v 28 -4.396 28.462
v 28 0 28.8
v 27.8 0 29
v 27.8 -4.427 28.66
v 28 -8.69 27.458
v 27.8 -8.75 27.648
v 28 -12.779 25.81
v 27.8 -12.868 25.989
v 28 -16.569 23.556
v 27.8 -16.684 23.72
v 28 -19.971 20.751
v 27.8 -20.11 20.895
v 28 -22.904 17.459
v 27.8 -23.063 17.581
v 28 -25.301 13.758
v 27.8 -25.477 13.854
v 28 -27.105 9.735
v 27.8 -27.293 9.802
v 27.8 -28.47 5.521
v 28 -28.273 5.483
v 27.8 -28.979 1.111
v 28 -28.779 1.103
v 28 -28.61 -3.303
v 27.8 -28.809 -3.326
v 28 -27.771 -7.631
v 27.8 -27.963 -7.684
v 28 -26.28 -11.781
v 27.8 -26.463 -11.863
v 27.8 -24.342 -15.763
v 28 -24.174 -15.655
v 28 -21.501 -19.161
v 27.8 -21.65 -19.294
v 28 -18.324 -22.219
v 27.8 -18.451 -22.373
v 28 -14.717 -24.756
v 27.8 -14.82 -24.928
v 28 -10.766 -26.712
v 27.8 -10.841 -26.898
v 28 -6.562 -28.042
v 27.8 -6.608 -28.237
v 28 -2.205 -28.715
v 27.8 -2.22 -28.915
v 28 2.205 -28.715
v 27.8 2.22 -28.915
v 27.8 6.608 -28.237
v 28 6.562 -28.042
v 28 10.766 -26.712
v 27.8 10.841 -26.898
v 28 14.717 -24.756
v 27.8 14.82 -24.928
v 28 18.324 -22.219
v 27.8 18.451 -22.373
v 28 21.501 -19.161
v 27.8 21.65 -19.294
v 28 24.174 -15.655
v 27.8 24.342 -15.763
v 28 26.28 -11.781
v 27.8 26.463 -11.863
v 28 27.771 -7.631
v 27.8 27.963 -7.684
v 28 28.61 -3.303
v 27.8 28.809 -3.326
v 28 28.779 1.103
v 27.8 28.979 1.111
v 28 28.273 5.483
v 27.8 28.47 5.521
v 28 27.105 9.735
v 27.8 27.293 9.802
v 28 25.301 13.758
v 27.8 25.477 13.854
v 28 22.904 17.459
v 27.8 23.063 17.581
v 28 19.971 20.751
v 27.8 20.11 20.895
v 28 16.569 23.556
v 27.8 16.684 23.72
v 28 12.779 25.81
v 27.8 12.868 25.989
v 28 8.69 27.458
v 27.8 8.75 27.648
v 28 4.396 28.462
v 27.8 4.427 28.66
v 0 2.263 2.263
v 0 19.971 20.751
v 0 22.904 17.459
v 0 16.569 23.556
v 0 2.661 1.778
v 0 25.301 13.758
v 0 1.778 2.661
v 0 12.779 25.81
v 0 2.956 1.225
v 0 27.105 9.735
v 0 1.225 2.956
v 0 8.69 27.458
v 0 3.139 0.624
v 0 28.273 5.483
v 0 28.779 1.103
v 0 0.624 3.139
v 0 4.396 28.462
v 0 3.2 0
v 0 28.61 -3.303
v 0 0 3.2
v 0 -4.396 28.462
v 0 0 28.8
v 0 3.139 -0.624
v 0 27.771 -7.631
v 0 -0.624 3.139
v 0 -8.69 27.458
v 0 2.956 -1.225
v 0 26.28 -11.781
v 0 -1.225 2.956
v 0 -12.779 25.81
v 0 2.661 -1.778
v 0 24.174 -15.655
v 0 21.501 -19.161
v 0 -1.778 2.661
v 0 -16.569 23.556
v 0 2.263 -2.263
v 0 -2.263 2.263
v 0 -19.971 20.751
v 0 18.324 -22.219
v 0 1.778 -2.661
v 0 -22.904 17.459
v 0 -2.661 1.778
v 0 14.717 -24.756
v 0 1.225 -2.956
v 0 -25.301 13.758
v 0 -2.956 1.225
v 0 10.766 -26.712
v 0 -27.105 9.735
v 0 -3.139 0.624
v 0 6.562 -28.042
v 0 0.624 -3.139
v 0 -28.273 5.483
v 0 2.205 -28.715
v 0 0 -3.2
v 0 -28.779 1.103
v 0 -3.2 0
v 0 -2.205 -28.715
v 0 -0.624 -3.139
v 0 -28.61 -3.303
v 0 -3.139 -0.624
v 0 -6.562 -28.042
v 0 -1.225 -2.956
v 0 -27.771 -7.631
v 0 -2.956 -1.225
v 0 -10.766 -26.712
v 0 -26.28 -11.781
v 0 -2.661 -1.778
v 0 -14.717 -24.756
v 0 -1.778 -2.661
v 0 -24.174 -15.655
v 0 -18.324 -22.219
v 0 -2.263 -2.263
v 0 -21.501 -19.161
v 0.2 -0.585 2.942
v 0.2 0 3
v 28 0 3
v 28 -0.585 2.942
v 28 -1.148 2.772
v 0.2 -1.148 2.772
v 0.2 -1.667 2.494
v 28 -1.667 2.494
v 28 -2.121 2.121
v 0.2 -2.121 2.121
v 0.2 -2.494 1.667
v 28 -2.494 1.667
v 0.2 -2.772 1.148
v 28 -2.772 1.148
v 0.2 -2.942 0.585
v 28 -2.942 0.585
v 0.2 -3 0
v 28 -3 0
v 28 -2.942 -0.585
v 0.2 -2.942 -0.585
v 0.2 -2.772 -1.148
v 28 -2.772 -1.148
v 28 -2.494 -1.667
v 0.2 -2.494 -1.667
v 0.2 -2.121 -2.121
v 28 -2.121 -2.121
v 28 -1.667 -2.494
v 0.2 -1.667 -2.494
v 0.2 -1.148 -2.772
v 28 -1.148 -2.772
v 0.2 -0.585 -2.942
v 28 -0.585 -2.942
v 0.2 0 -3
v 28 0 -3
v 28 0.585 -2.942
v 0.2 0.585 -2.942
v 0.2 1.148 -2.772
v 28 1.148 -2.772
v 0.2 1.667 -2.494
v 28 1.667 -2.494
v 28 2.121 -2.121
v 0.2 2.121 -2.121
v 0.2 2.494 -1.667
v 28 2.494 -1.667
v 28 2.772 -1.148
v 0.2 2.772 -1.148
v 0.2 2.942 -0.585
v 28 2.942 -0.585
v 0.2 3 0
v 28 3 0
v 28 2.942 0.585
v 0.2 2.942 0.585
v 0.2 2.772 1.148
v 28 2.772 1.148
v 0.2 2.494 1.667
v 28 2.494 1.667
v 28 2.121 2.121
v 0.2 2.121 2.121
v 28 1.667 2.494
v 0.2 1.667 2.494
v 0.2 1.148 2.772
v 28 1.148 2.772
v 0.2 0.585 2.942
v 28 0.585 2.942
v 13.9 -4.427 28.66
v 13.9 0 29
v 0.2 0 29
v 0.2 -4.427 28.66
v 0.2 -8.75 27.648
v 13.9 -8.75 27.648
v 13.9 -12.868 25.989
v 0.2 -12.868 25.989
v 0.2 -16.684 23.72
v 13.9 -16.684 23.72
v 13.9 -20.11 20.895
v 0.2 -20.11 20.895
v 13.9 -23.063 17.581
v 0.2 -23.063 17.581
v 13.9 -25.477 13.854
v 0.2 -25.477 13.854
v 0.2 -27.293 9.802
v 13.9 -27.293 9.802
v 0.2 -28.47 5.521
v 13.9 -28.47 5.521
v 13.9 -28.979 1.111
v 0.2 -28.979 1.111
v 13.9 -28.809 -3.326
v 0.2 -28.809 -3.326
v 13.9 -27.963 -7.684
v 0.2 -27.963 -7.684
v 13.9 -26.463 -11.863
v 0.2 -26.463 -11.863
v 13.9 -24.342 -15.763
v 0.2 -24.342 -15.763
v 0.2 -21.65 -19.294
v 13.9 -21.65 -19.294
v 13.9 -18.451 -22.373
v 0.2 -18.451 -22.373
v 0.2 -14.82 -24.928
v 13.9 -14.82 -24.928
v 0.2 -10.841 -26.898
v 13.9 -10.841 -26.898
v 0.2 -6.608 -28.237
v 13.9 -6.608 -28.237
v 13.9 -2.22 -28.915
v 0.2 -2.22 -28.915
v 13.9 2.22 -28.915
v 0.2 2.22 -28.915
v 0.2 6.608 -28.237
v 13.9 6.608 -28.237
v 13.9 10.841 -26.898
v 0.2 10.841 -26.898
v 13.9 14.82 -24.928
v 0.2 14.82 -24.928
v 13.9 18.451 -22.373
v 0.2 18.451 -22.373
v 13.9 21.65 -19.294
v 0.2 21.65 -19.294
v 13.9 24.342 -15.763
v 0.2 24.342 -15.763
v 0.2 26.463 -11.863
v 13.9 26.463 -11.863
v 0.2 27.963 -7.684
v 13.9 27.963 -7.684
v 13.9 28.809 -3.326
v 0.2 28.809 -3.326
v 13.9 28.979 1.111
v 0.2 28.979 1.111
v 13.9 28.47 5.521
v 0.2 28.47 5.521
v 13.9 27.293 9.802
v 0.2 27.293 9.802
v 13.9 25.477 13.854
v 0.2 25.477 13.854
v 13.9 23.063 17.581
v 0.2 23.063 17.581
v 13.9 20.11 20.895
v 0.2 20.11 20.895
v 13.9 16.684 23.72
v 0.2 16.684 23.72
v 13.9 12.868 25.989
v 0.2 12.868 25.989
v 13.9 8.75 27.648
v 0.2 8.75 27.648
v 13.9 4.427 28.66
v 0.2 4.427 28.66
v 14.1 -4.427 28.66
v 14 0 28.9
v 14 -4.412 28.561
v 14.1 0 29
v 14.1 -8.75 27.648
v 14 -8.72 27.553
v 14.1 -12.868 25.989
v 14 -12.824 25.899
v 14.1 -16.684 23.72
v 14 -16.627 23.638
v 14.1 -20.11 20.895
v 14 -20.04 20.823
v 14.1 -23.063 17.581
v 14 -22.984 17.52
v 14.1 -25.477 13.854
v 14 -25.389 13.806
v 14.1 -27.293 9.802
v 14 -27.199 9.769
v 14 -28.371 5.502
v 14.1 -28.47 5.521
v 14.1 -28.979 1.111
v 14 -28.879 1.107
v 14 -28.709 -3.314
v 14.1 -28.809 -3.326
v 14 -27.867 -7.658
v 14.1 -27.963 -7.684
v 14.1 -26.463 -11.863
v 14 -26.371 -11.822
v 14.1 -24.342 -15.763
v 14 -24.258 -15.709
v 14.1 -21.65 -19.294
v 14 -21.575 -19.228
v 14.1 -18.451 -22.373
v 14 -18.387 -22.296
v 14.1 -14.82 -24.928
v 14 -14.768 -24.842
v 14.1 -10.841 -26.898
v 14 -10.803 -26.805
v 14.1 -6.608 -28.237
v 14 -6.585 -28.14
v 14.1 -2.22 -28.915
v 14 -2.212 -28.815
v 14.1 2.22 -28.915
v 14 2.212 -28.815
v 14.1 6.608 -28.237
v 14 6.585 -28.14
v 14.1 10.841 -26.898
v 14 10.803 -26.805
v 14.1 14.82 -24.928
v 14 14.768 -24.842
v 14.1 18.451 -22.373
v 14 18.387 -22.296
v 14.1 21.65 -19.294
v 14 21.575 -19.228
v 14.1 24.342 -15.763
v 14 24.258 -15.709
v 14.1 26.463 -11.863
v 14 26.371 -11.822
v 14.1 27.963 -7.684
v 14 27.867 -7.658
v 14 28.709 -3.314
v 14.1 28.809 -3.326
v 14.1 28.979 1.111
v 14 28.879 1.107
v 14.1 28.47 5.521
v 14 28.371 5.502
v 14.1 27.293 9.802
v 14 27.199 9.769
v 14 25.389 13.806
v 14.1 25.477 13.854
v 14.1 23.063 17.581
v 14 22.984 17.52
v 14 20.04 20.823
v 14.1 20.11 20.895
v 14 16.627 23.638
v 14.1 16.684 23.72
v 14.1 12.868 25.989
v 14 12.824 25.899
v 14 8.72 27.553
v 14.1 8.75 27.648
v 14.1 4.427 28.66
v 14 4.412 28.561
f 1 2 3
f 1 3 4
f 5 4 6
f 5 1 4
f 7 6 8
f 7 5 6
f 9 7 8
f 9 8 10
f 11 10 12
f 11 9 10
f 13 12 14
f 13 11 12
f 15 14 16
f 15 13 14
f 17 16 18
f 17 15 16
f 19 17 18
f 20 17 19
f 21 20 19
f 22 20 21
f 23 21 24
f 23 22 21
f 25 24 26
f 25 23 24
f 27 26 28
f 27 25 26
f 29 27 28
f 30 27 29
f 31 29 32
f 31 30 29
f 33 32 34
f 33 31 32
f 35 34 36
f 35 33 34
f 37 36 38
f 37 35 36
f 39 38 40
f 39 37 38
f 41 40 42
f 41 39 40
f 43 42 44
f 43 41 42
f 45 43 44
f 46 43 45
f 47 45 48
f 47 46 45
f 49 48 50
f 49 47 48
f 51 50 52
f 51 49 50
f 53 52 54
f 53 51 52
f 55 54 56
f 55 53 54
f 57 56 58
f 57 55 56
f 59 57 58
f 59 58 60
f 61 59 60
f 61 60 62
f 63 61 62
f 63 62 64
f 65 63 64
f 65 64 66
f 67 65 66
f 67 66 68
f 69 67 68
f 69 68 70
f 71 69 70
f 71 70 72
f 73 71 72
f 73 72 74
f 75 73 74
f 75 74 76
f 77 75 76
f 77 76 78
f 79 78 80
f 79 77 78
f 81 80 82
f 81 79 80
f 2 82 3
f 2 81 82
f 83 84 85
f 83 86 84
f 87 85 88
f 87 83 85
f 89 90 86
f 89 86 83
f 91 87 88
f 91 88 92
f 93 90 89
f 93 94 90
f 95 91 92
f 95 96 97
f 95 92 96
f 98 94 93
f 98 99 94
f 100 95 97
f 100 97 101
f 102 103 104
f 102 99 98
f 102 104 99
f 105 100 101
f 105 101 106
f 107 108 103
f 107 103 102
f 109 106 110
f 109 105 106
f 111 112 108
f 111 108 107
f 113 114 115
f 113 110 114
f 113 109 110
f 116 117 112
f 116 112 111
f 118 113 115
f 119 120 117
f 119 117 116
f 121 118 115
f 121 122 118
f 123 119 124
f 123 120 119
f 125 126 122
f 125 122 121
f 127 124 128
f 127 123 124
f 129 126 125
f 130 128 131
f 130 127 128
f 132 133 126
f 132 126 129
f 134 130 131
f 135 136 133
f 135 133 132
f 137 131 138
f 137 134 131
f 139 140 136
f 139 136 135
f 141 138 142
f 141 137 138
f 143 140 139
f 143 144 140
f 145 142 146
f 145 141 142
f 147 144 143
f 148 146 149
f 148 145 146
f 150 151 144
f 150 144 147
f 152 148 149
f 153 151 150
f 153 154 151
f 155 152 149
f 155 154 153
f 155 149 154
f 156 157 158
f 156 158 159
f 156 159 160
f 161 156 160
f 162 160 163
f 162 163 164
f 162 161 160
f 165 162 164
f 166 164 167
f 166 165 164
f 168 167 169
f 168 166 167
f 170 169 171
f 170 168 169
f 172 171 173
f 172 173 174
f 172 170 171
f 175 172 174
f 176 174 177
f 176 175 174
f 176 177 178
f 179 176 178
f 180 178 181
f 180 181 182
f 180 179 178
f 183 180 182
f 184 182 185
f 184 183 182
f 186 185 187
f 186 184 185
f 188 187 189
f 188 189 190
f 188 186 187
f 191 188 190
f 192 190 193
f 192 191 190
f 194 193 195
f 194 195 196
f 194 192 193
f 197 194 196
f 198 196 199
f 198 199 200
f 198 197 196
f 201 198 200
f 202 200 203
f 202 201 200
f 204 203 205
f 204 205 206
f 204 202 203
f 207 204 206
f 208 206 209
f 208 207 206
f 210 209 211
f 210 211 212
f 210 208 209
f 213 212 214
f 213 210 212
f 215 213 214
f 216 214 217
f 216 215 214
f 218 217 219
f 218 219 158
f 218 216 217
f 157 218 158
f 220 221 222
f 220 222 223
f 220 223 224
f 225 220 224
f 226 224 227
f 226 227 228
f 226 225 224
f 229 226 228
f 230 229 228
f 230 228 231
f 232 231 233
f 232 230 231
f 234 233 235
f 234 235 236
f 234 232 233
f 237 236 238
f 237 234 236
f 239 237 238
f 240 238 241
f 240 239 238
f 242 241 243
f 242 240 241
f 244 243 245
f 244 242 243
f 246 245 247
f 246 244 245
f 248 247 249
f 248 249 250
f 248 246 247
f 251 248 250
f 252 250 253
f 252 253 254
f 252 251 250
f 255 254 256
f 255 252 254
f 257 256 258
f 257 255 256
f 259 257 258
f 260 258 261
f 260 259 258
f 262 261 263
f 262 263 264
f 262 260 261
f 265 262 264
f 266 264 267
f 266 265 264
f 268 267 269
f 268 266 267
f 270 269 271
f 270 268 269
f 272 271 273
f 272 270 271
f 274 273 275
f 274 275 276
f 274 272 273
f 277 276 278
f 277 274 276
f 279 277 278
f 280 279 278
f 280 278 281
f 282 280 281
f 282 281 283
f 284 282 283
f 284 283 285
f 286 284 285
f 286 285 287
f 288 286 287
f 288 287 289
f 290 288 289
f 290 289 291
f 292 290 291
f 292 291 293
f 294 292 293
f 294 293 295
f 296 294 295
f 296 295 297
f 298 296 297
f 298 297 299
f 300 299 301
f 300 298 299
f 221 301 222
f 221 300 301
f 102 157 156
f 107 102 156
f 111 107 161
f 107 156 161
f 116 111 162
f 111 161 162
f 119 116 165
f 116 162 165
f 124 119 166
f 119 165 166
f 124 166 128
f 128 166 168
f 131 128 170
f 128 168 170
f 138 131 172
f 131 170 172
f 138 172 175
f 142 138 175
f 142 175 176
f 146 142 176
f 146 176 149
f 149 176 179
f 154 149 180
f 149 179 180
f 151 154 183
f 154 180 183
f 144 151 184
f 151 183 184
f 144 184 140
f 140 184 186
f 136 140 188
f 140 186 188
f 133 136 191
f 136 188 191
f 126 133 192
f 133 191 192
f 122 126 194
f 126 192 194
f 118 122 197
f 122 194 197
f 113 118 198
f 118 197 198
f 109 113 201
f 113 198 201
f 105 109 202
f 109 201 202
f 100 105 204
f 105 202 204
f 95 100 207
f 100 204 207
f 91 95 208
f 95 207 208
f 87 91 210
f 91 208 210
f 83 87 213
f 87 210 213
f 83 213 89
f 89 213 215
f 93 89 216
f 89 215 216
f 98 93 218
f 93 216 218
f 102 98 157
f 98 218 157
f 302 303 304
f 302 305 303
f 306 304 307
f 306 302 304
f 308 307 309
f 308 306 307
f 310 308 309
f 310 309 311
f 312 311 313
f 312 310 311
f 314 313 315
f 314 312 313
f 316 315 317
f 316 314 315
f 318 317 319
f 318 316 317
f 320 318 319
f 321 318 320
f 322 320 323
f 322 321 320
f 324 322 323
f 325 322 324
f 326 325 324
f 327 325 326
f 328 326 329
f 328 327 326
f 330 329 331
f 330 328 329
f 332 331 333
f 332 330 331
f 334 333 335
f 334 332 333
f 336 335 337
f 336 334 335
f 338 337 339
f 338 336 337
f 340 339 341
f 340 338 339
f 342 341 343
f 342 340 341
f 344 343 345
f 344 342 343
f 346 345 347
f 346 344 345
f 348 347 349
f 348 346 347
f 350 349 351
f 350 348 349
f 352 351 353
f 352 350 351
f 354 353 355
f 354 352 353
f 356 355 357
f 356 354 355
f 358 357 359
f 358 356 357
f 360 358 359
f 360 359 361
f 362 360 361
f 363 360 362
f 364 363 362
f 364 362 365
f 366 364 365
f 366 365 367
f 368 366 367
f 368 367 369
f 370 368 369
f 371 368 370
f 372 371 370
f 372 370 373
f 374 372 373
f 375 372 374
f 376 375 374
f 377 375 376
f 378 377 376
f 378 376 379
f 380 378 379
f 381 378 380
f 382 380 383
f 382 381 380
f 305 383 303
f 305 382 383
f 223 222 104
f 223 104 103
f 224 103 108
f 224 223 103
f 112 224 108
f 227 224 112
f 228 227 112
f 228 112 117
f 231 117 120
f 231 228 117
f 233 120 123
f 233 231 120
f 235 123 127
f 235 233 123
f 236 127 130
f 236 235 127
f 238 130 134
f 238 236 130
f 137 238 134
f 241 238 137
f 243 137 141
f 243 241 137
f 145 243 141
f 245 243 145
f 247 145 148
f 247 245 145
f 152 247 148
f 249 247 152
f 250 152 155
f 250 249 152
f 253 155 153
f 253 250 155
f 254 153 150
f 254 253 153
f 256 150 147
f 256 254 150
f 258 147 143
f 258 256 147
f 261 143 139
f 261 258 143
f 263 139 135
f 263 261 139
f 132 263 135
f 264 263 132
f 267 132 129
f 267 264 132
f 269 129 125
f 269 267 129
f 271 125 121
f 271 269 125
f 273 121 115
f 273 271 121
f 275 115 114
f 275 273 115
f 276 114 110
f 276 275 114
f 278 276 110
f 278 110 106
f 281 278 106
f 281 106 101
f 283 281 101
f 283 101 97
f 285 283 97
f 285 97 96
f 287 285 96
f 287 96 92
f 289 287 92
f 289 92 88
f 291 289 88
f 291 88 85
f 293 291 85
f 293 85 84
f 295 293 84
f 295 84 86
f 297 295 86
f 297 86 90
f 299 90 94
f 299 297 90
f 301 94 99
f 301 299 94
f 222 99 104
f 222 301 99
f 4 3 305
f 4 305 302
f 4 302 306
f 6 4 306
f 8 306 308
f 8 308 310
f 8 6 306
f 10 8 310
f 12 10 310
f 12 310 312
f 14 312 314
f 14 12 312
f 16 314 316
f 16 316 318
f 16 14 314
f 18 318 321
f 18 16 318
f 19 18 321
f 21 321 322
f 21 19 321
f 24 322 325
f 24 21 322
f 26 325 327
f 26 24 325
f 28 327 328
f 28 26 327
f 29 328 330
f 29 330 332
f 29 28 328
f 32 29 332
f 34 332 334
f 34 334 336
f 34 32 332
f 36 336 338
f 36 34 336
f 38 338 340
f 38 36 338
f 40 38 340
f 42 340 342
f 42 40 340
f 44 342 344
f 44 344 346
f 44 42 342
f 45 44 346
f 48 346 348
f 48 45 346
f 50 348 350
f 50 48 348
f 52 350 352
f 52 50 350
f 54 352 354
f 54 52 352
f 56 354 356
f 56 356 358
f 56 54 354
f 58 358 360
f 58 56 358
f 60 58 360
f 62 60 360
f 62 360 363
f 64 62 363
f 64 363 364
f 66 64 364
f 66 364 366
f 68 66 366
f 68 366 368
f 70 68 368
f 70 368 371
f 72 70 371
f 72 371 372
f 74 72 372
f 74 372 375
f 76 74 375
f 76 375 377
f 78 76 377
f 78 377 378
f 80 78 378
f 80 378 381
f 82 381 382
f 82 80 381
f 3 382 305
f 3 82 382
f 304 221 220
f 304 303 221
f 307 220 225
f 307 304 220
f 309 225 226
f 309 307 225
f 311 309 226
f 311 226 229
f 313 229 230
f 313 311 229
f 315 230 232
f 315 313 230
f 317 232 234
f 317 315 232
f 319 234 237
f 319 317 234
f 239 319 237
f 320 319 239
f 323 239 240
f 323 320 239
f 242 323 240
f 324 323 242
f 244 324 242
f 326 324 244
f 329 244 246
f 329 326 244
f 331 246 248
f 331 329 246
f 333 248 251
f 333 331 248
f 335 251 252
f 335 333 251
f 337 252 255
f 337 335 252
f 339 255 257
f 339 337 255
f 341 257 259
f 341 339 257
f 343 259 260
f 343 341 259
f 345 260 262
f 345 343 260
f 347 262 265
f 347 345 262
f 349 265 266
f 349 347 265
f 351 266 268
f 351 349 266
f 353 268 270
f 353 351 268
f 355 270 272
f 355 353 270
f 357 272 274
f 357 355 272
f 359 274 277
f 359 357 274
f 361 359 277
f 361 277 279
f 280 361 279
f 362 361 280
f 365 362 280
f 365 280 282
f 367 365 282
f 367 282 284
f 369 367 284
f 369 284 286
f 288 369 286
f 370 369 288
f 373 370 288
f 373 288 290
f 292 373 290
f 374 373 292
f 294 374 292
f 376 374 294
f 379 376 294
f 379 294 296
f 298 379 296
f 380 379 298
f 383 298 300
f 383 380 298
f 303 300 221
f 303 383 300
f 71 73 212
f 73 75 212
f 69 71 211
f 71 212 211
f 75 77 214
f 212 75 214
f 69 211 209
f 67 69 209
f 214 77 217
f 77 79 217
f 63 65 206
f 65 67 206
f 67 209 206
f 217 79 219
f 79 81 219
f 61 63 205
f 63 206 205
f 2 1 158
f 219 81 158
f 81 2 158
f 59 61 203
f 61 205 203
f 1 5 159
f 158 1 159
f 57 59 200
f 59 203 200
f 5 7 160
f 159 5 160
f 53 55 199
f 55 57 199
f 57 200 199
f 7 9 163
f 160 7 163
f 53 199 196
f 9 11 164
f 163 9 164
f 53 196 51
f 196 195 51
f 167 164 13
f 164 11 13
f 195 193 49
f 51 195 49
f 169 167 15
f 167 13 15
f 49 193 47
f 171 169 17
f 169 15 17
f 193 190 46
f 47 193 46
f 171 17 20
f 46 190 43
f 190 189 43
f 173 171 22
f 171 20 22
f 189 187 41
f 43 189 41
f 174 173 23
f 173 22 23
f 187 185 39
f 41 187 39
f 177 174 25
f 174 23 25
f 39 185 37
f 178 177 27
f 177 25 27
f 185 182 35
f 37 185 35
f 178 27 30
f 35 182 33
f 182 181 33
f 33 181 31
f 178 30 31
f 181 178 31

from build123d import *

# Parameters (mm, degrees)
CHAMFER_1_SIZE = 0.2


with BuildPart() as part:
    # 草图1 → 旋转1 (revolve)
    with BuildSketch(Plane.XY, mode=Mode.PRIVATE) as revolve_1_sk:
        Polygon((0, 3), (0, 29), (13.9, 29), (14, 28.9), (14.1, 29), (28, 29), (28, 13), (28, 10), (28, 3), align=None)
    revolve(revolve_1_sk.sketch.rotate(Axis((0, 0, 0), (1, 0, 0)), 90), axis=Axis((0, 0, 0), (1, 0, 0)))

    # 倒角1
    chamfer_1_edges = [part.edges().sort_by_distance(p)[0] for p in [
        (0, 0, -3),
        (28, 0, -29),
        (0, 0, -29),
    ]]
    chamfer(chamfer_1_edges, length=CHAMFER_1_SIZE)


solid = part.part
